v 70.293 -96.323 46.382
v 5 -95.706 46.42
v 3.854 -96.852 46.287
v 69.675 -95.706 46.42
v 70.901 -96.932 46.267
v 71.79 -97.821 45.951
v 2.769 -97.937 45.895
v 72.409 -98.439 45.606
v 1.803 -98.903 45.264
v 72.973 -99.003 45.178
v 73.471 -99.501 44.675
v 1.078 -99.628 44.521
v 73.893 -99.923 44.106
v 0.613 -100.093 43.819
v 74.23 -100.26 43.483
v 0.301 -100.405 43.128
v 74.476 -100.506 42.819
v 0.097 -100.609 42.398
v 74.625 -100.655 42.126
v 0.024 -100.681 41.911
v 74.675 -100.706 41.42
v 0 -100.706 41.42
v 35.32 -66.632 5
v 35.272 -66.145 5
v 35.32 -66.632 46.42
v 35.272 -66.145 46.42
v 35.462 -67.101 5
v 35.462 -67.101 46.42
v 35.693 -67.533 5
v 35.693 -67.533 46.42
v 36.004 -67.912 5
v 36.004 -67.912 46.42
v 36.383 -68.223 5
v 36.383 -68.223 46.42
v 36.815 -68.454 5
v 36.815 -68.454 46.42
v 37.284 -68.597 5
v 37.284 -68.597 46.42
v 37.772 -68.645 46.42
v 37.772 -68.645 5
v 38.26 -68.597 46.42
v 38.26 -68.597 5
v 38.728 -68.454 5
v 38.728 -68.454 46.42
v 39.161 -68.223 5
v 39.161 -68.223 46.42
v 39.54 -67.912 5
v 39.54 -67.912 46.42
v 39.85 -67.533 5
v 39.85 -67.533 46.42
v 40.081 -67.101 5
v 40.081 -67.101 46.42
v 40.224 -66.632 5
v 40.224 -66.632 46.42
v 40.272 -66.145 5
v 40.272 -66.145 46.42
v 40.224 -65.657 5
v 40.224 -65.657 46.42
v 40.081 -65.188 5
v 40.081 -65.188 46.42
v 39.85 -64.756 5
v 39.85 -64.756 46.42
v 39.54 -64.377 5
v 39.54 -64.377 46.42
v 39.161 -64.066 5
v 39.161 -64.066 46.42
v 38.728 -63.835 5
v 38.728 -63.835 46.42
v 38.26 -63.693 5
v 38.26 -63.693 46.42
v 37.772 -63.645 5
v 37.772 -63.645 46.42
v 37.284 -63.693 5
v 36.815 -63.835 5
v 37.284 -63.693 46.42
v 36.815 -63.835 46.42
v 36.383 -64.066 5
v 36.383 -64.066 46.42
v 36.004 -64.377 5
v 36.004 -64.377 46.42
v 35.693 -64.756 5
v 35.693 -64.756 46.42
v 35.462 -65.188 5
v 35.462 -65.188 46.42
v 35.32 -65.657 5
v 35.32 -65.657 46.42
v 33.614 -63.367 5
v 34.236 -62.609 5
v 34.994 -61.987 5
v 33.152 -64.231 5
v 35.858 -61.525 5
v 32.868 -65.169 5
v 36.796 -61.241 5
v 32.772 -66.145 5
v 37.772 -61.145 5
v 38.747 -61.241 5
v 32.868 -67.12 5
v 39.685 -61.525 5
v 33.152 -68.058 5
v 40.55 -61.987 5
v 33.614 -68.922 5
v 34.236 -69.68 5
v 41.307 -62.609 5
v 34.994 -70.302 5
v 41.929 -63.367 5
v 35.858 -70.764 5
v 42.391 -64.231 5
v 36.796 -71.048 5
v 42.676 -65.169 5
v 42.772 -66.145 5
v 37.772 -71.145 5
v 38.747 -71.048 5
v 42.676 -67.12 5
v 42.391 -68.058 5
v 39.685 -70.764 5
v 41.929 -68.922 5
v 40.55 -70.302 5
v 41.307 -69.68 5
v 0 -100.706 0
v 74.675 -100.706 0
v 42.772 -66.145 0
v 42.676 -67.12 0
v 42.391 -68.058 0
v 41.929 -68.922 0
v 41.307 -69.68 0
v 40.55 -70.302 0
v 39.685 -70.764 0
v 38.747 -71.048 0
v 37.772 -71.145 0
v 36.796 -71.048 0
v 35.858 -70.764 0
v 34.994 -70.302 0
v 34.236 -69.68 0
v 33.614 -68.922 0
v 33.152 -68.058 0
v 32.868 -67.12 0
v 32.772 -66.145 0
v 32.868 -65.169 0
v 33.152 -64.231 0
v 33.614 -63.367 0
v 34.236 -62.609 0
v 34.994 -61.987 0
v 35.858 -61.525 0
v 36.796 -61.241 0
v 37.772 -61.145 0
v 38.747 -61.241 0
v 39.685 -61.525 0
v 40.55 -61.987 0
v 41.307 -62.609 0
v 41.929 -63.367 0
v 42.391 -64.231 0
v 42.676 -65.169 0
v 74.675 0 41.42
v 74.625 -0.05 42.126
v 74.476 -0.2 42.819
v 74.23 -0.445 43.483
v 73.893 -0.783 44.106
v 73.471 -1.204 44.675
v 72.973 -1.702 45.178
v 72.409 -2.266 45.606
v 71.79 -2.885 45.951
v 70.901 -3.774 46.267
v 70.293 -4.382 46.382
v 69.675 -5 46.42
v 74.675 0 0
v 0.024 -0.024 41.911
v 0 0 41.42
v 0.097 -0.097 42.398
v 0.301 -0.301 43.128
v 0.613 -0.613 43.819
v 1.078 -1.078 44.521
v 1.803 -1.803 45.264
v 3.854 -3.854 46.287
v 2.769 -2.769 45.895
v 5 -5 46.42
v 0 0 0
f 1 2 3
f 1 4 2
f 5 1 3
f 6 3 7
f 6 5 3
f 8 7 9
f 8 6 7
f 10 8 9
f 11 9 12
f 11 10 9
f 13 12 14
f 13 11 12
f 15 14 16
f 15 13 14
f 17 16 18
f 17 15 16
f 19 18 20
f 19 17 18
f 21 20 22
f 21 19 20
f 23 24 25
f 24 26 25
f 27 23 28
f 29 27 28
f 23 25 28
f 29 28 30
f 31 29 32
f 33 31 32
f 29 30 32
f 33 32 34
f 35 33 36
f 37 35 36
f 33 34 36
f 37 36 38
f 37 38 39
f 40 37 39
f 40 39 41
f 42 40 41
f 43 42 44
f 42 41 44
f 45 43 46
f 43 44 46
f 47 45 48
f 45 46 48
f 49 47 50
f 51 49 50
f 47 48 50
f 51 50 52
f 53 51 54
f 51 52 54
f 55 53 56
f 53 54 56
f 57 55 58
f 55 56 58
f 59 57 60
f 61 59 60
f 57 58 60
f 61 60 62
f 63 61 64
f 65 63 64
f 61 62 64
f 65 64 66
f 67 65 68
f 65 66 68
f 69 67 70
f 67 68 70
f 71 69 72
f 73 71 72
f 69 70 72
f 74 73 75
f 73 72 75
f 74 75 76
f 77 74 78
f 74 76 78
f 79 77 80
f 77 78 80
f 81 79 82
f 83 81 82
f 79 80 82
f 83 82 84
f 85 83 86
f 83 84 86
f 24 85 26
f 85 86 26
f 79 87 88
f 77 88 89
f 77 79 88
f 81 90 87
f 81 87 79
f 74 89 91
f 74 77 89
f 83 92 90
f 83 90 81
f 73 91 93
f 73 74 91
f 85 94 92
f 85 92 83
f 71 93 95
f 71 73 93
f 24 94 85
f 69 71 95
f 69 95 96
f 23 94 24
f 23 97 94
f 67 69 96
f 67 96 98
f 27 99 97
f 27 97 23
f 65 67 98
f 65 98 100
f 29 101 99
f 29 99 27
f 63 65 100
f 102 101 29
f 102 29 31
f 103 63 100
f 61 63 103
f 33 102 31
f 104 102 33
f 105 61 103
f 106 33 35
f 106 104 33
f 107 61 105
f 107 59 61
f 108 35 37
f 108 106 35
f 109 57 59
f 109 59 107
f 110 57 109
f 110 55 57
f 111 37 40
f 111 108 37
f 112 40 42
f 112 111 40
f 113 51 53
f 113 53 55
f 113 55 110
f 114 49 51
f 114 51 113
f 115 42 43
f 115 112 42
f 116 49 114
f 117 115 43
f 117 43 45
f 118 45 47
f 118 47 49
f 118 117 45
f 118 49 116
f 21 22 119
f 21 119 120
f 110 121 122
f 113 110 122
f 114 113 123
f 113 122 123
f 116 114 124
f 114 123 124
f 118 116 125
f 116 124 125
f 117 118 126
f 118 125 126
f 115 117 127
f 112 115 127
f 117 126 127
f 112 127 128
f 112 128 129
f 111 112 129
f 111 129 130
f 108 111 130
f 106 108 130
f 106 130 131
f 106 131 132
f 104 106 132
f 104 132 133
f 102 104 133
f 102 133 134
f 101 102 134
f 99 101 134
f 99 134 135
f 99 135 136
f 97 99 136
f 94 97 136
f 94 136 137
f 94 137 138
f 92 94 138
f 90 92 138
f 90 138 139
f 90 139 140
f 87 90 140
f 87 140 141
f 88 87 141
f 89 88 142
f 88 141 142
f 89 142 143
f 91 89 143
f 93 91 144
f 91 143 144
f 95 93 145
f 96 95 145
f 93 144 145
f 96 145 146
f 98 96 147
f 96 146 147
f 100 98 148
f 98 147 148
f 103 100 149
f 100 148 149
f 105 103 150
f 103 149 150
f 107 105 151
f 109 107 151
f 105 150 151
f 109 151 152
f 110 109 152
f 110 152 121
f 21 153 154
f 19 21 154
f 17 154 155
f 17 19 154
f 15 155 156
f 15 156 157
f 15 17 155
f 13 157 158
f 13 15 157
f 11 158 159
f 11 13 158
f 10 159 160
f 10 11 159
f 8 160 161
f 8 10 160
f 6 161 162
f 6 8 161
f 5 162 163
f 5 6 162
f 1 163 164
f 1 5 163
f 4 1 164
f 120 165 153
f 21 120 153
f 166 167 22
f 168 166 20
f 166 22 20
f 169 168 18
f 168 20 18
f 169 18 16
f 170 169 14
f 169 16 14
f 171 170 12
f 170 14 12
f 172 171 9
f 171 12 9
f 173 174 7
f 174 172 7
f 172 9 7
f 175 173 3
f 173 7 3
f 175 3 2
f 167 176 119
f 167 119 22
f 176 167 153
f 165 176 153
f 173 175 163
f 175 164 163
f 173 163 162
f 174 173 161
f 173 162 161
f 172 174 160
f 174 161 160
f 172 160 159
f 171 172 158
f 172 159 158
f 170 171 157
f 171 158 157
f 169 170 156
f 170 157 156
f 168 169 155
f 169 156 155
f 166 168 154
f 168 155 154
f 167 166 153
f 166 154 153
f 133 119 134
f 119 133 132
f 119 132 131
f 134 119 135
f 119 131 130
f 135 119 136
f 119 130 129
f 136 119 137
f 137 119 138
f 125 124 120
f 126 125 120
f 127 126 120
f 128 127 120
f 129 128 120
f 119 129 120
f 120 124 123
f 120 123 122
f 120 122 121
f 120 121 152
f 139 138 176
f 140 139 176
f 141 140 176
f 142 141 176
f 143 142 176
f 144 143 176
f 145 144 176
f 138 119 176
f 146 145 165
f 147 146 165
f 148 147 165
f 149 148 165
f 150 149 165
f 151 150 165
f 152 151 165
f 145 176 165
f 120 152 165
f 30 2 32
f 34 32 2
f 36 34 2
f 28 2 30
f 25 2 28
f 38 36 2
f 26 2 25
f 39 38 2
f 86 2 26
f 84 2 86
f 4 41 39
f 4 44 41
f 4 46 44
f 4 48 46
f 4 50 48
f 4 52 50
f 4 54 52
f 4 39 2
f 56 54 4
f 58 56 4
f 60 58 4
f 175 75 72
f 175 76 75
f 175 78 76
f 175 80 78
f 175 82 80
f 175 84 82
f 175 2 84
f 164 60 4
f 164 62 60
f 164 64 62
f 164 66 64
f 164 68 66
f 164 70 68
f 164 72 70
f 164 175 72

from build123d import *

# Parameters (mm, degrees)
F3_W           = 74.675485
F3_H           = 46.419974
F0_DEPTH       = 100.705625
F1_R           = 5
F2_D           = 5
F2_CBORE_D     = 10
F2_CBORE_DEPTH = 5


with BuildPart() as f0:
    # F3 (on Front) → F0 (new body)
    with BuildSketch(Plane.XZ):
        with Locations((37.337742, 23.209987)):
            Rectangle(F3_W, F3_H)
    extrude(amount=F0_DEPTH)

    # F1
    f1_edges = [f0.edges().sort_by_distance(p)[0] for p in [
        (74.675485, -50.352813, 46.419974),
        (37.337743, -100.705625, 46.419974),
        (37.337743, 0, 46.419974),
        (0, -50.352813, 46.419974),
    ]]
    fillet(f1_edges, radius=F1_R)

    # F2 (through all)
    with Locations(Plane(origin=(0, 0, 0), x_dir=(1, 0, 0), z_dir=(0, 0, -1))):
        with Locations((37.771776, 66.144571)):
            CounterBoreHole(F2_D / 2, F2_CBORE_D / 2, F2_CBORE_DEPTH)


solid = f0.part
